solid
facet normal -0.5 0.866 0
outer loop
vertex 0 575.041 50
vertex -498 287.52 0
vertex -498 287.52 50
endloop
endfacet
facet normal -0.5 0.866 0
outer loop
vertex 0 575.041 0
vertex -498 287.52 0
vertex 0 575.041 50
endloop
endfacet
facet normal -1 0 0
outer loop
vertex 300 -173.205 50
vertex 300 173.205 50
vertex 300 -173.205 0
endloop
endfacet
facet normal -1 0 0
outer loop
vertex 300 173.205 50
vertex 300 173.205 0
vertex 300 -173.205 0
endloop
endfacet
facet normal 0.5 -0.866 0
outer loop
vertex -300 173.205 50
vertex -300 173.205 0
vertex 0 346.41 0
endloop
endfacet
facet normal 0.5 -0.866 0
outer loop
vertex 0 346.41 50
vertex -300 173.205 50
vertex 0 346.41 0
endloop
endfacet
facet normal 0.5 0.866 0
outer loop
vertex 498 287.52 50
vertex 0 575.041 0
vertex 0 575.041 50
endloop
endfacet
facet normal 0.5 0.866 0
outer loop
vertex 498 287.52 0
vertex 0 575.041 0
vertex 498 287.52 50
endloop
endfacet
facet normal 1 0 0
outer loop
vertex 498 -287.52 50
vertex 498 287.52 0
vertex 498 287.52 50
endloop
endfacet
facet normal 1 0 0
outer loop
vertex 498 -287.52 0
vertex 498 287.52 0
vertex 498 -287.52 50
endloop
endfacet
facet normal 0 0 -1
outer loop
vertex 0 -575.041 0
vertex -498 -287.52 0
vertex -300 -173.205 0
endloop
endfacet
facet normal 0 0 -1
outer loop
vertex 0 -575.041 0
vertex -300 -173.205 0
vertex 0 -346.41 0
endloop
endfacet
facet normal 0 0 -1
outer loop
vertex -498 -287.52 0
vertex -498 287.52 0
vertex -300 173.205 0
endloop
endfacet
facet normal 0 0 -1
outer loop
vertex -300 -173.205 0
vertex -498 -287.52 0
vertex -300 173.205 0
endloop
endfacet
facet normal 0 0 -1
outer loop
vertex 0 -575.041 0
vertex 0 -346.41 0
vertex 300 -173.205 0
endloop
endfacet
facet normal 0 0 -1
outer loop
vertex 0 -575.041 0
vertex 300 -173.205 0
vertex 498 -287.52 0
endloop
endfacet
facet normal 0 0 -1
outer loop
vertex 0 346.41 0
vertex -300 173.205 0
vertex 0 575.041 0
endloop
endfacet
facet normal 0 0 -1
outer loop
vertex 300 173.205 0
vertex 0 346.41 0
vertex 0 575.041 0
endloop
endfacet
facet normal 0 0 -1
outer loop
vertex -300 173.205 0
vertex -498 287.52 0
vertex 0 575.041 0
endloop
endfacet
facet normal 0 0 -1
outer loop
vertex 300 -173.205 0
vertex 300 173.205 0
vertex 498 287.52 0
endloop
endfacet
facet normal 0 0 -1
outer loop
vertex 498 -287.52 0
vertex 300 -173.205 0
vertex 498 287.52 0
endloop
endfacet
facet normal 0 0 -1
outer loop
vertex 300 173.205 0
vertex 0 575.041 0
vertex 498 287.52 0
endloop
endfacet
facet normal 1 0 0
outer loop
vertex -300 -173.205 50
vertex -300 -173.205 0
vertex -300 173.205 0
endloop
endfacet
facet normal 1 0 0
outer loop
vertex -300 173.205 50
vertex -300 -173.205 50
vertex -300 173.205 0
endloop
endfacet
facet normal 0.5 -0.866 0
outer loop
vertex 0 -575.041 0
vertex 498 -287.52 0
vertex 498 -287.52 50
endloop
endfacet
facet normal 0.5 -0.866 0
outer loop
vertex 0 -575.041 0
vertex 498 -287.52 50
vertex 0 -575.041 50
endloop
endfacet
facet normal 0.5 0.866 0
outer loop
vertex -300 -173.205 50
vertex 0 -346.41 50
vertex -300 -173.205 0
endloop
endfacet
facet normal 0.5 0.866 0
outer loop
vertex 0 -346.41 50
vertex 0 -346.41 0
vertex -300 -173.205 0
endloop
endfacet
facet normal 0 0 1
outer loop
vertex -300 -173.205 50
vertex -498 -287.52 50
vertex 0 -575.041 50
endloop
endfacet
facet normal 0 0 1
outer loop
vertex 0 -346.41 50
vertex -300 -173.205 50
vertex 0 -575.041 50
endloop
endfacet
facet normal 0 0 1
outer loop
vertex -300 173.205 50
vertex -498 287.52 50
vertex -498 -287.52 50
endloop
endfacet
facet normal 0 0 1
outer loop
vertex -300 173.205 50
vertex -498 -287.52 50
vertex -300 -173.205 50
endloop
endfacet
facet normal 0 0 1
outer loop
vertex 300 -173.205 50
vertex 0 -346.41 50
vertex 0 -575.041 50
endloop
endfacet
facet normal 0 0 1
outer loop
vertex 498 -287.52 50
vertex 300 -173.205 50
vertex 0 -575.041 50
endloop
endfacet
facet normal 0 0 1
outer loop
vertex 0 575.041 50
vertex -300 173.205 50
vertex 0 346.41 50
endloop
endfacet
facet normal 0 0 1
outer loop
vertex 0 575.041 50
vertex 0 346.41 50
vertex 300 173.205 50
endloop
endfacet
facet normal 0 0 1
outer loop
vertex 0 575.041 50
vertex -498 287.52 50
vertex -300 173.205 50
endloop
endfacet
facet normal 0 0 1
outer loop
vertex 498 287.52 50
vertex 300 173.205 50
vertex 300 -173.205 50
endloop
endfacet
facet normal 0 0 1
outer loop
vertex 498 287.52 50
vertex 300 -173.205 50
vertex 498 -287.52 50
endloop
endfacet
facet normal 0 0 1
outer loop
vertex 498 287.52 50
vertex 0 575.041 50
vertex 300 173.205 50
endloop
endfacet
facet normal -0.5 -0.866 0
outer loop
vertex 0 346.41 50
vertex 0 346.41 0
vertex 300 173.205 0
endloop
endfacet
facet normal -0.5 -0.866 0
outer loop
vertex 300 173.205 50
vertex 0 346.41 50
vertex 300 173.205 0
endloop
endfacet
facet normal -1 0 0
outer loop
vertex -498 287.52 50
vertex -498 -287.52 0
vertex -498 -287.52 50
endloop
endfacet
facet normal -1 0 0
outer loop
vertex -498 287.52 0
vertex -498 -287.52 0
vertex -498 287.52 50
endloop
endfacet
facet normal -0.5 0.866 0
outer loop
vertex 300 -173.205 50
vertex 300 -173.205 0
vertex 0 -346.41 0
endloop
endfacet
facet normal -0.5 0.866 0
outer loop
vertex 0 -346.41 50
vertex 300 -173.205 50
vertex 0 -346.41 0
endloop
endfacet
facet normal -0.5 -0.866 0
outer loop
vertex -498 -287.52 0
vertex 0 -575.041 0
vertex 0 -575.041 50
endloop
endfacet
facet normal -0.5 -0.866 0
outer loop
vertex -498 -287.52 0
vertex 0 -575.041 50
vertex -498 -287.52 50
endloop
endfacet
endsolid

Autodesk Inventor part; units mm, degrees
ref_plane "YZ Plane" through (0, 0, 0) normal (1, 0, 0) x (0, 1, 0)
ref_plane "XZ Plane" through (0, 0, 0) normal (0, 1, 0) x (-1, 0, 0)
ref_plane "XY Plane" through (0, 0, 0) normal (0, 0, 1) x (1, 0, 0)
ref_plane "Work Plane1" through (0, 0, 0) normal (0, 0, 1) x (1, 0, 0)
sketch "Sketch1" plane through (0, 0, 0) normal (0, 0, 1) x (1, 0, 0)
  line L0 (498, -287.5204) -> (0, -575.0409)
  line L1 (0, -575.0409) -> (-498, -287.5204)
  line L2 (-498, -287.5204) -> (-498, 287.5204)
  line L3 (-498, 287.5204) -> (0, 575.0409)
  line L4 (0, 575.0409) -> (498, 287.5204)
  line L5 (498, 287.5204) -> (498, -287.5204)
  line L6 (300, -173.2051) -> (0, -346.4102)
  line L7 (0, -346.4102) -> (-300, -173.2051)
  line L8 (-300, -173.2051) -> (-300, 173.2051)
  line L9 (-300, 173.2051) -> (0, 346.4102)
  line L10 (0, 346.4102) -> (300, 173.2051)
  line L11 (300, 173.2051) -> (300, -173.2051)
  point P0 (0, 0)
  point P1 (0, 0)
  point P2 (0, 0)
  dimension "d0" = 300
  dimension "d1" = 498
extrude "Extrusion1" add sketch "Sketch1" along normal blind 50
properties part number "Electrical" material "Acetal Resin, White"
